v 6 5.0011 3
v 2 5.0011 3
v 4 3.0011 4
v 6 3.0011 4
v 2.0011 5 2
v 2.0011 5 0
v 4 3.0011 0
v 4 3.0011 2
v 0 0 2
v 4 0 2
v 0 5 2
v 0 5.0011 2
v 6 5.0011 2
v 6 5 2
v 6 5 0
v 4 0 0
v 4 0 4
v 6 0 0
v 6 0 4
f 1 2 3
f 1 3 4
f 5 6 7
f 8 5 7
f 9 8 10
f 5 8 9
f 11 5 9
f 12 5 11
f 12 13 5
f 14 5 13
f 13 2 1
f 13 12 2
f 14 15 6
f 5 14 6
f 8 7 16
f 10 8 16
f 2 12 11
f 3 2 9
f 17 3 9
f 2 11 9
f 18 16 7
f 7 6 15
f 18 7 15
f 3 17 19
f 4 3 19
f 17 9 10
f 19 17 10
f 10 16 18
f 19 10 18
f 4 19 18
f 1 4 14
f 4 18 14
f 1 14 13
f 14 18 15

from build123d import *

# Parameters (mm, degrees)
BOSS_EXTRUDE1_DEPTH = 2
SKETCH2_W           = 6
SKETCH2_H           = 5.001068762
BOSS_EXTRUDE2_DEPTH = 2
CHAMFER1_SIZE       = 1
CHAMFER1_SIZE2      = 2
CUT_EXTRUDE2_DEPTH  = 2
CUT_EXTRUDE3_DEPTH  = 2


with BuildPart() as part:
    # Sketch1 → Boss-Extrude1 (new body)
    with BuildSketch(Plane.XY):
        Polygon((0, 0), (6, 0), (6, 5), (2, 5), (0, 5), (0, 3), align=None)
    extrude(amount=BOSS_EXTRUDE1_DEPTH)

    # Sketch2 → Boss-Extrude2 (add)
    with BuildSketch(Plane.XY.offset(2)):
        with Locations((3, 2.500534381)):
            Rectangle(SKETCH2_W, SKETCH2_H)
    extrude(amount=BOSS_EXTRUDE2_DEPTH)

    # Chamfer1
    chamfer1_edges = [part.edges().sort_by_distance(p)[0] for p in [
        (3, 5.001068762, 4),
    ]]
    chamfer1_side = [part.faces().sort_by_distance(p)[0] for p in [
        (3, 5.001068762, 3),
    ]]
    chamfer(chamfer1_edges, length=CHAMFER1_SIZE, length2=CHAMFER1_SIZE2, reference=chamfer1_side[0])

    # 3DSketch1 → Cut-Extrude2 (cut, along a direction that is not the sketch's normal)
    with BuildSketch(Plane(origin=(2, 5.001068762, 3), x_dir=(0.36508333931807946, -0.9129034418767683, 0.18254166965903973), z_dir=(0.447213595499958, 0, -0.894427190999916))):
        Polygon((0, 0), (2.738515232, -1.224962989), (5.478201234, 0), (3.652784538, 4.082628306), (-0.912708348, 2.041314153), align=None)
    extrude(amount=-CUT_EXTRUDE2_DEPTH, dir=(0, 0, -1), mode=Mode.SUBTRACT)

    # Sketch4 → Cut-Extrude3 (cut)
    with BuildSketch(Plane(origin=(0, 0, 0), x_dir=(-1, 0, 0), z_dir=(0, 0, -1))):
        Polygon((0, 5.000534381), (-2, 5.001068762), (-4, 3.001068762), (-4, 0), (0, 0), align=None)
    extrude(amount=-CUT_EXTRUDE3_DEPTH, mode=Mode.SUBTRACT)


solid = part.part
